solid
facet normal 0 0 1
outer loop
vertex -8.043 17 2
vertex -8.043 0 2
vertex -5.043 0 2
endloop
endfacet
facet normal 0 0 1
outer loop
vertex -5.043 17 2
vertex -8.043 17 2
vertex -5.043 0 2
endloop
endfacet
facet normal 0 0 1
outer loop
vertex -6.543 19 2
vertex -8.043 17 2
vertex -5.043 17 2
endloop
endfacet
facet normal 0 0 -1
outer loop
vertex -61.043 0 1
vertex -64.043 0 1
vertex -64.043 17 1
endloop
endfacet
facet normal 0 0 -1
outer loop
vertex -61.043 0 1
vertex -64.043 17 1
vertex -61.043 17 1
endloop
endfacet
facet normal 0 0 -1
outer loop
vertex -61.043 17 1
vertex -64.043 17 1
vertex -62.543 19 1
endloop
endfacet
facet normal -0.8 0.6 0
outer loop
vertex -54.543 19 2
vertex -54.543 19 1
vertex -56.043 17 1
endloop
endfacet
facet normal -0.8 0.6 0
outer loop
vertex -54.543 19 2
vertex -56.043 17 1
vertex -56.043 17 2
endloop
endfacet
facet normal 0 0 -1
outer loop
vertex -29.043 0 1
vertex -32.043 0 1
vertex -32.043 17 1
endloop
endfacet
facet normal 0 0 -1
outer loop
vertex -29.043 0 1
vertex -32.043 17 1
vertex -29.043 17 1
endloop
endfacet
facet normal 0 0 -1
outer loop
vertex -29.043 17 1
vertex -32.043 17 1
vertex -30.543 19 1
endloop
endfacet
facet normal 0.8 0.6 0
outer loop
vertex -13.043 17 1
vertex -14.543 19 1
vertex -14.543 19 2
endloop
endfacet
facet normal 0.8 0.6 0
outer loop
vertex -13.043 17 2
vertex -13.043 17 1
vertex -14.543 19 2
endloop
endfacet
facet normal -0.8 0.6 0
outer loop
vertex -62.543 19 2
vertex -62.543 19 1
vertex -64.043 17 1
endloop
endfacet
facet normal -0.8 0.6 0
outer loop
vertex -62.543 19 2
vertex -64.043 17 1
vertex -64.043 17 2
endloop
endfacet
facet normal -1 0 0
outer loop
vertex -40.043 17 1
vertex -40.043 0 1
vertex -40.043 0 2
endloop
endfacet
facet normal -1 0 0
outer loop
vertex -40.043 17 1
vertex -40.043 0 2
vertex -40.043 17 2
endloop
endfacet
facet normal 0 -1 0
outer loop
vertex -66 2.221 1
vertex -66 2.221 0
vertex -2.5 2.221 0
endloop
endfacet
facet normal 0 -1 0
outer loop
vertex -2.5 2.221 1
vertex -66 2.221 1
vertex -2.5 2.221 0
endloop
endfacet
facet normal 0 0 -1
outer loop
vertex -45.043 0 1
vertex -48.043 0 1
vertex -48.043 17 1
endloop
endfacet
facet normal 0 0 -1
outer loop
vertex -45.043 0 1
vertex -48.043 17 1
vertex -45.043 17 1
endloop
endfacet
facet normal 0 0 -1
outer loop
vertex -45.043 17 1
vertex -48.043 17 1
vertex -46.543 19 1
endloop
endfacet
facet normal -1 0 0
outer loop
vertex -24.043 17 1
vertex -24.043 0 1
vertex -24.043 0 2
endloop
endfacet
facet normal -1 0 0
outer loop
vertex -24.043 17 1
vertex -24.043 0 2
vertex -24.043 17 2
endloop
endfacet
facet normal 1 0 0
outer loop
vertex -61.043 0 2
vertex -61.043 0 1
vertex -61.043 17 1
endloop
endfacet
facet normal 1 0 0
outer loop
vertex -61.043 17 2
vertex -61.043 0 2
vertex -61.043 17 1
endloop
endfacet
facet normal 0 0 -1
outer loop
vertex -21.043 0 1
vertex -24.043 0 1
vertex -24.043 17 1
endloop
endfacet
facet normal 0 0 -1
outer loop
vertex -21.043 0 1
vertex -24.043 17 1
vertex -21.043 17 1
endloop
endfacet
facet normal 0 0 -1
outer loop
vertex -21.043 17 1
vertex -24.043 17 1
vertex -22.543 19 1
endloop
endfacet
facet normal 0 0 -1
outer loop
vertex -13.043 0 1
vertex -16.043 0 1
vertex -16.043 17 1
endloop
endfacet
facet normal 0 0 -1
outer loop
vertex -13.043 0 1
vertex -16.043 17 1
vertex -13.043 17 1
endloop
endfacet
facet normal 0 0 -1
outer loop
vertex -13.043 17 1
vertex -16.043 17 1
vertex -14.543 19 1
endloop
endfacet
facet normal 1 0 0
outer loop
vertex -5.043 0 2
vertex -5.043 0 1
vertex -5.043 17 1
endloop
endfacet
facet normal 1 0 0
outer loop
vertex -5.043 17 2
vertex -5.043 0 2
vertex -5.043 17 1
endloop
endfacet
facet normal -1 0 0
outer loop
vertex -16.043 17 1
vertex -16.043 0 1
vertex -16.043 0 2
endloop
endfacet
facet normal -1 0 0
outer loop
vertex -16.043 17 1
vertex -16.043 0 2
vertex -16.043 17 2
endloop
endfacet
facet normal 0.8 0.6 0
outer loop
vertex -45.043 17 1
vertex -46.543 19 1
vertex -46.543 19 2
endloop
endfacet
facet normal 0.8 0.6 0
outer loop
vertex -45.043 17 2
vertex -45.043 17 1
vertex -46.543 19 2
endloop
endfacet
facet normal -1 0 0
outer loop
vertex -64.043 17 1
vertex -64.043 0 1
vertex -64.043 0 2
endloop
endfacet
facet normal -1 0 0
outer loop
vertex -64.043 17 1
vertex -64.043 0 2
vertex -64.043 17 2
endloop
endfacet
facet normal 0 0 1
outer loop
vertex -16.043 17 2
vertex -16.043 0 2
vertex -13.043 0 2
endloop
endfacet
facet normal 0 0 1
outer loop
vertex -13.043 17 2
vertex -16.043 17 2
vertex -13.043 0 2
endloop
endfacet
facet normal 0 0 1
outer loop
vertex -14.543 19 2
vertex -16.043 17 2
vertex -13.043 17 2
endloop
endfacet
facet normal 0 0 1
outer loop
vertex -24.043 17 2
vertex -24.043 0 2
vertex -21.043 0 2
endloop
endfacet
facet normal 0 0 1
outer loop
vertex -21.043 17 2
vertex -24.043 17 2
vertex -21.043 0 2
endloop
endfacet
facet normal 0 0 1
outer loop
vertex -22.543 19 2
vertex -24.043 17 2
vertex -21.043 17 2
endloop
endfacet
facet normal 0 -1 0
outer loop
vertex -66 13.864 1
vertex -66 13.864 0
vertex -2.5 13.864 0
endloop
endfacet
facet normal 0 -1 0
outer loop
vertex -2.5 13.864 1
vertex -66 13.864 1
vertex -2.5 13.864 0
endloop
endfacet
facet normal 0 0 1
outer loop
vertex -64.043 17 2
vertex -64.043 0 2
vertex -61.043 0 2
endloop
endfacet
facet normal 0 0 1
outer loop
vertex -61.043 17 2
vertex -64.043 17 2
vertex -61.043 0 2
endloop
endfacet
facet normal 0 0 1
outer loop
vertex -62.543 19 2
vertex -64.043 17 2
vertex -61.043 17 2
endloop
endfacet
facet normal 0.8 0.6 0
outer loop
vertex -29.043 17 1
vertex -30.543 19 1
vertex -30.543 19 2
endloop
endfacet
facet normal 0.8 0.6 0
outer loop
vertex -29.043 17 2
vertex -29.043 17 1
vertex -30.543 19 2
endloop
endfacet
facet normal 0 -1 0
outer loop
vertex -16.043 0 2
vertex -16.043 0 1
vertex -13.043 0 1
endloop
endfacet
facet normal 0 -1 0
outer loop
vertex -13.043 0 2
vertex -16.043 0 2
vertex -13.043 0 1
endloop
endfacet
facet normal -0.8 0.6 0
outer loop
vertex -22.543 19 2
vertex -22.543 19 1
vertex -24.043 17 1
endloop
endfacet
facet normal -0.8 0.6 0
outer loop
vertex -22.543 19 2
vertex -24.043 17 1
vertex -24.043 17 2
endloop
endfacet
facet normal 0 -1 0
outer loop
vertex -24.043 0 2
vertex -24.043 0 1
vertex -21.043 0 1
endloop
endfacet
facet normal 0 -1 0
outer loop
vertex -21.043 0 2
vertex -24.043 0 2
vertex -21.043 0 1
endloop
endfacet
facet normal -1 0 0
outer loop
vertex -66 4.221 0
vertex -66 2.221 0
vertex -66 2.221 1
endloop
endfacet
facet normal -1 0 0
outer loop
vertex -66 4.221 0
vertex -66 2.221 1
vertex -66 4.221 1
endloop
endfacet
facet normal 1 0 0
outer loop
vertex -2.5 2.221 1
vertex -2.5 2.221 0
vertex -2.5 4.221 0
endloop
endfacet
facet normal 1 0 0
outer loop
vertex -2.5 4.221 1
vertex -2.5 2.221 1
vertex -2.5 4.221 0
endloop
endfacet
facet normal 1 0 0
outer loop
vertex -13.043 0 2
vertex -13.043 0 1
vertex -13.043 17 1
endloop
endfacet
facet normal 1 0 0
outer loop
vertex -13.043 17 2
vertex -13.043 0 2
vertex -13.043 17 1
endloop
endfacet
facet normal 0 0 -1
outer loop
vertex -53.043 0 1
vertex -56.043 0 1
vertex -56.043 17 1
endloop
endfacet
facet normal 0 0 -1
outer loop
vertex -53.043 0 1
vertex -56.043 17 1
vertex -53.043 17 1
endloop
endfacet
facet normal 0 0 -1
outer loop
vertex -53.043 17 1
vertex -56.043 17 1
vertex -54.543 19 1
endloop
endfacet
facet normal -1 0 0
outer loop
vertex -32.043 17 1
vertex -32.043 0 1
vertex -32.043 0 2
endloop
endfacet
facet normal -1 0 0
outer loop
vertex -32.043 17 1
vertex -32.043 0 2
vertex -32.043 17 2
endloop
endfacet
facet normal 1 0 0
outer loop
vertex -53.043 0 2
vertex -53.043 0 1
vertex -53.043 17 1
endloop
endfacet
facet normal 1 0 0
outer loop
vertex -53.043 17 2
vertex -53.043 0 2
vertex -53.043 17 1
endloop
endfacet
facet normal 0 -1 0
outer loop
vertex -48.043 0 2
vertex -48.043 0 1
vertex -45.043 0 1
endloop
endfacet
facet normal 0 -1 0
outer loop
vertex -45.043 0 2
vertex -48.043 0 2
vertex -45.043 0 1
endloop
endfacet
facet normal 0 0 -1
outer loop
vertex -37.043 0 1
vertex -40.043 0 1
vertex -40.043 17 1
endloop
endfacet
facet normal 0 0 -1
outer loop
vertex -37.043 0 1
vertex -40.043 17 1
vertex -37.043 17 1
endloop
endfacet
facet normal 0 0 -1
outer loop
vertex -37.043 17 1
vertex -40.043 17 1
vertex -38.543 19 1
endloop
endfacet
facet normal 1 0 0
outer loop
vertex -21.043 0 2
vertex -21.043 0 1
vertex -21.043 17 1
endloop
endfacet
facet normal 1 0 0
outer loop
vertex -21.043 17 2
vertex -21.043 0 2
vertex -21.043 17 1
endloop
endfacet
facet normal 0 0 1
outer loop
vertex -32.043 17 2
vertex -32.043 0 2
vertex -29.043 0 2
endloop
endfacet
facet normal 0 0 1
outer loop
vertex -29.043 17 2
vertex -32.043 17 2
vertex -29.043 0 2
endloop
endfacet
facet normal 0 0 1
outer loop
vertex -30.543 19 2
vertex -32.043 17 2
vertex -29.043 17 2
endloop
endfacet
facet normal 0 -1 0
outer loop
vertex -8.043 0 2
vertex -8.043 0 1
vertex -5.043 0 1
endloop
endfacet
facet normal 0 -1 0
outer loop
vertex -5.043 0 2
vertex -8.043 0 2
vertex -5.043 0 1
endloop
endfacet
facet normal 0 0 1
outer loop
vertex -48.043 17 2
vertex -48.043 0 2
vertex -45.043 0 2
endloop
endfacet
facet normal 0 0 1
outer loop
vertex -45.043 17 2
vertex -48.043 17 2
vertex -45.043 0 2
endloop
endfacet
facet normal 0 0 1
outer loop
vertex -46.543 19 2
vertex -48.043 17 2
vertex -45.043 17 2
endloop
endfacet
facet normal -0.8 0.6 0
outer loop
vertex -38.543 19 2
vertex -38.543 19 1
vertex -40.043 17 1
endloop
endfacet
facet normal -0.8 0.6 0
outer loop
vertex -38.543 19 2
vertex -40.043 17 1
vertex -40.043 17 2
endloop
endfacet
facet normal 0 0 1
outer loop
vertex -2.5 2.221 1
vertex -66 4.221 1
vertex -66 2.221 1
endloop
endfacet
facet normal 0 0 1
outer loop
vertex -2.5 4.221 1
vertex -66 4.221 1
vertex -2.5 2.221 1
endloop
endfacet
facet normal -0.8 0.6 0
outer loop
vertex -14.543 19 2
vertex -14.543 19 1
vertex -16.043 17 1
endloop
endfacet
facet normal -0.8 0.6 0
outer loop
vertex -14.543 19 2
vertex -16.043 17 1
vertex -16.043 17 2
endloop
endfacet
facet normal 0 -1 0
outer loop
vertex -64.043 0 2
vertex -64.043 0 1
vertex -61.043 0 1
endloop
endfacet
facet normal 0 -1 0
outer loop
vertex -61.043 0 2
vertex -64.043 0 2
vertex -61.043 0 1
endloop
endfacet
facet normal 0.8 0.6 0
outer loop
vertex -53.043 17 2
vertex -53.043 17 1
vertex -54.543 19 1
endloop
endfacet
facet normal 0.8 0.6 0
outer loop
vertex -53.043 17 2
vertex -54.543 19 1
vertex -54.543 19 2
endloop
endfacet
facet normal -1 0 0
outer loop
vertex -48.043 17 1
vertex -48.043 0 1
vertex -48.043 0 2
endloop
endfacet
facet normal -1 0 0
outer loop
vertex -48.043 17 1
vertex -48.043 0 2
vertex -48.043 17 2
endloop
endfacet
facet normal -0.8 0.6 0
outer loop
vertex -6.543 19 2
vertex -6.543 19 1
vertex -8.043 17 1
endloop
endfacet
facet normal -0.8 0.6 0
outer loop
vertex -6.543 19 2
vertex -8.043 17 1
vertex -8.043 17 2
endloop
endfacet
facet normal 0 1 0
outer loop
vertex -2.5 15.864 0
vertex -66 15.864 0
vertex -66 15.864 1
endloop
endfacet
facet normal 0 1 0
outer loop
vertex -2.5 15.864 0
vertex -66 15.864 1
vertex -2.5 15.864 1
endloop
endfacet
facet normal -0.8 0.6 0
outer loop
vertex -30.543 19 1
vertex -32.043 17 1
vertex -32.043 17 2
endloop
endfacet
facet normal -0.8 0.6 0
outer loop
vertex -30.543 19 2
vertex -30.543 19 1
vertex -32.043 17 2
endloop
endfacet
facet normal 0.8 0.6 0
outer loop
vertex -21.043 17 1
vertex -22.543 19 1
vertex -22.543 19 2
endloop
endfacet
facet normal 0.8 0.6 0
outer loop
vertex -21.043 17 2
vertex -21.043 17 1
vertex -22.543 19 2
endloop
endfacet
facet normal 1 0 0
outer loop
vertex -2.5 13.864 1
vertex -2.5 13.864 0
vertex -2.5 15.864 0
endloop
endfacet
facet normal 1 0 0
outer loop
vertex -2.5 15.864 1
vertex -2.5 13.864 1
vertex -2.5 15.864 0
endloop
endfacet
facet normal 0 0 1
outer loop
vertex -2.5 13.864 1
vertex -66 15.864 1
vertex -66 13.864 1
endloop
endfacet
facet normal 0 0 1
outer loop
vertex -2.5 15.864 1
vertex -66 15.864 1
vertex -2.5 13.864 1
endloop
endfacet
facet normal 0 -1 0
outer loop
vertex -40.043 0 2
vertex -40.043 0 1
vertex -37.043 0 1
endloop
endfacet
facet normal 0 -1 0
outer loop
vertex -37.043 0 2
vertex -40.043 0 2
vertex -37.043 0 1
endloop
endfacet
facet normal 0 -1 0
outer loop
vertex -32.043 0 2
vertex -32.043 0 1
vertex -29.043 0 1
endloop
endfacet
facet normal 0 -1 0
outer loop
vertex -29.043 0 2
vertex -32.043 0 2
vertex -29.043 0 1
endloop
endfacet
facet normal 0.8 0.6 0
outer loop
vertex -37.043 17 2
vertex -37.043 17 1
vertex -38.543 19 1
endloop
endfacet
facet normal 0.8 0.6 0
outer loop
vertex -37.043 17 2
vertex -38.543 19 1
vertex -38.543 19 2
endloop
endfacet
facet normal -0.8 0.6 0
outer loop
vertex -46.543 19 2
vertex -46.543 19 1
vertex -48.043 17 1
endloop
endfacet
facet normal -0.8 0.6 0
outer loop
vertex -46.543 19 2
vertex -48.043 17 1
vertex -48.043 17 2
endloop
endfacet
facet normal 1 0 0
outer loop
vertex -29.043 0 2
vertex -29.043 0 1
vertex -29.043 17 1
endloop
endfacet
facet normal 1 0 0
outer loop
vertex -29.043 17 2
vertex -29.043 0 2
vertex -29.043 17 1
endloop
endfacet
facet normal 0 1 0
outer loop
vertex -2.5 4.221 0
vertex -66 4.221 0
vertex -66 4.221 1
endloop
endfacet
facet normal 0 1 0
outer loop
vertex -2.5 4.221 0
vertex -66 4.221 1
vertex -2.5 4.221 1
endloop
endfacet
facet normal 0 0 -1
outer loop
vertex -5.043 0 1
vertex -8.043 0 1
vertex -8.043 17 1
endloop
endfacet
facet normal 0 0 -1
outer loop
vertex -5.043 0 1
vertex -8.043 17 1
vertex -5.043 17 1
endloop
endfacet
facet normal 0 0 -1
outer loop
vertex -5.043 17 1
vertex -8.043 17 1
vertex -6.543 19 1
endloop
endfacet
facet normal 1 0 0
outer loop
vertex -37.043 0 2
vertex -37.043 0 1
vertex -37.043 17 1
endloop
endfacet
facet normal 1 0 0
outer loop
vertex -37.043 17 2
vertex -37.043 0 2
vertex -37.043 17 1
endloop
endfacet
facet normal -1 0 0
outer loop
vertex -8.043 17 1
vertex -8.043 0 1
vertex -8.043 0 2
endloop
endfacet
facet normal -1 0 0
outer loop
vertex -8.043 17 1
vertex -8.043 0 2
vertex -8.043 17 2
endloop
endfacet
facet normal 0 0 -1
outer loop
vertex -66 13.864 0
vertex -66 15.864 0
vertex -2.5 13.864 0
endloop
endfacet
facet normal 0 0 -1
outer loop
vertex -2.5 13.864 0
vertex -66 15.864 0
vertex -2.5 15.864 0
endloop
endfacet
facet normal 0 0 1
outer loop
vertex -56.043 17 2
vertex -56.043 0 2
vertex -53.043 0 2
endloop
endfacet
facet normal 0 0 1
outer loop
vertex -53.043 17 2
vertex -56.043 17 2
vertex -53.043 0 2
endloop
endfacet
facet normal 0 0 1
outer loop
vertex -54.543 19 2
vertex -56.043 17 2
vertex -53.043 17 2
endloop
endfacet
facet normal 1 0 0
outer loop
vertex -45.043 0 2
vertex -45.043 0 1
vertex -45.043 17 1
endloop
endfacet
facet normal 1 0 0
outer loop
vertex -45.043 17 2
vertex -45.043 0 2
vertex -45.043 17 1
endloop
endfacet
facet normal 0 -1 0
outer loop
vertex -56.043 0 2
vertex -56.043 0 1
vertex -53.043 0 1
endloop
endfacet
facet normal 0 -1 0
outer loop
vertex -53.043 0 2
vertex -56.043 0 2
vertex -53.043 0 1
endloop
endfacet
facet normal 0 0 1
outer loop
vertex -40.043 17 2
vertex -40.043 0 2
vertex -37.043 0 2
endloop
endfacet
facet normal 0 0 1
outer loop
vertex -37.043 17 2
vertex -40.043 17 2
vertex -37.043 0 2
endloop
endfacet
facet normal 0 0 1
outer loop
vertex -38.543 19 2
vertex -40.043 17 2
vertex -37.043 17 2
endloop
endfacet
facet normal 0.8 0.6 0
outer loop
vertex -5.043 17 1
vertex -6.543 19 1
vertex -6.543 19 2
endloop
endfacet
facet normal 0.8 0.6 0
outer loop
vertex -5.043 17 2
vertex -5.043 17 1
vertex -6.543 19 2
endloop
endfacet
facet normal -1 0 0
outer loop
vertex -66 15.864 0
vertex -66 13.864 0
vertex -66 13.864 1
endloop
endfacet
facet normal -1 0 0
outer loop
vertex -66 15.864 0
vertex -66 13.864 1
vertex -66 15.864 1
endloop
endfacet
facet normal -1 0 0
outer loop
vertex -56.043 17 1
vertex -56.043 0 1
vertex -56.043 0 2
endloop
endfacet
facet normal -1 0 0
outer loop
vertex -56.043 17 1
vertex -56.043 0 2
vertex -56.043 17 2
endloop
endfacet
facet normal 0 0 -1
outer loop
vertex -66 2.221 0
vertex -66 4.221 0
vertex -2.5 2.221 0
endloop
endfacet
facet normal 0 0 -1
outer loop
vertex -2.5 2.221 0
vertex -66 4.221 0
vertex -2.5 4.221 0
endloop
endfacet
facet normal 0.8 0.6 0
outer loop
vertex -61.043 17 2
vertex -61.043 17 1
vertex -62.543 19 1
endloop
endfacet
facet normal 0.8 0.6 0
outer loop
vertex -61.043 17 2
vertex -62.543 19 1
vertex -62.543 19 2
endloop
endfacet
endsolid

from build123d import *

# Parameters (mm, degrees)
F1_START    = 1
F0_W        = 3
F0_H        = 19
F1_DEPTH    = 1
F2_W        = 63.5
F2_H        = 2
F3_DEPTH    = 1
F4_SIZE2    = 1.5
F4_SIZE     = 2
F4_2_SIZE2  = 1.49999
F4_2_SIZE   = 1.99999
F4_3_SIZE2  = 1.5
F4_3_SIZE   = 2
F4_4_SIZE2  = 1.49999
F4_4_SIZE   = 1.99999
F4_5_SIZE2  = 1.5
F4_5_SIZE   = 2
F4_6_SIZE2  = 1.49999
F4_6_SIZE   = 1.99999
F4_7_SIZE2  = 1.5
F4_7_SIZE   = 2
F4_8_SIZE2  = 1.49999
F4_8_SIZE   = 1.99999
F4_9_SIZE2  = 1.5
F4_9_SIZE   = 2
F4_10_SIZE2 = 1.49999
F4_10_SIZE  = 1.99999
F4_11_SIZE2 = 1.5
F4_11_SIZE  = 2
F4_12_SIZE2 = 1.49999
F4_12_SIZE  = 1.99999
F4_13_SIZE2 = 1.5
F4_13_SIZE  = 2
F4_14_SIZE2 = 1.49999
F4_14_SIZE  = 1.99999
F4_15_SIZE2 = 1.5
F4_15_SIZE  = 2
F4_16_SIZE2 = 1.49999
F4_16_SIZE  = 1.99999


# Not quite as in the source:
# - a fillet or chamfer is up to 0.001 mm smaller than in the source, because OpenCascade refuses the exact size


with BuildPart() as f1:
    # F0 (on Top) → F1 (new body)
    with BuildSketch(Plane.XY.offset(F1_START)):
        with Locations((-62.5430910557, 9.5)):
            Rectangle(F0_W, F0_H)
    extrude(amount=F1_DEPTH)

    # F4
    f4_edges = [f1.edges().sort_by_distance(p)[0] for p in [
        (-64.043091, 19, 1.5),
    ]]
    f4_side = f1.faces().sort_by_distance((-64.043091, 9.5, 1.5))[0]
    chamfer(f4_edges, length=F4_SIZE, length2=F4_SIZE2, reference=f4_side)

    # F4#2 (size 2 and 1.5 in the source; OpenCascade refuses exactly that, so slightly less here)
    f4_2_edges = [f1.edges().sort_by_distance(p)[0] for p in [
        (-61.043091, 19, 1.5),
    ]]
    f4_2_side = f1.faces().sort_by_distance((-61.043091, 9.5, 1.5))[0]
    chamfer(f4_2_edges, length=F4_2_SIZE, length2=F4_2_SIZE2, reference=f4_2_side)


with BuildPart() as f1b:
    # F0 (on Top) → F1, piece 2 (new body)
    with BuildSketch(Plane.XY.offset(F1_START)):
        with Locations((-54.5430910557, 9.5)):
            Rectangle(F0_W, F0_H)
    extrude(amount=F1_DEPTH)

    # F4#3
    f4_3_edges = [f1b.edges().sort_by_distance(p)[0] for p in [
        (-56.043091, 19, 1.5),
    ]]
    f4_3_side = f1b.faces().sort_by_distance((-56.043091, 9.5, 1.5))[0]
    chamfer(f4_3_edges, length=F4_3_SIZE, length2=F4_3_SIZE2, reference=f4_3_side)

    # F4#4 (size 2 and 1.5 in the source; OpenCascade refuses exactly that, so slightly less here)
    f4_4_edges = [f1b.edges().sort_by_distance(p)[0] for p in [
        (-53.043091, 19, 1.5),
    ]]
    f4_4_side = f1b.faces().sort_by_distance((-53.043091, 9.5, 1.5))[0]
    chamfer(f4_4_edges, length=F4_4_SIZE, length2=F4_4_SIZE2, reference=f4_4_side)


with BuildPart() as f1c:
    # F0 (on Top) → F1, piece 3 (new body)
    with BuildSketch(Plane.XY.offset(F1_START)):
        with Locations((-46.5430910557, 9.5)):
            Rectangle(F0_W, F0_H)
    extrude(amount=F1_DEPTH)

    # F4#5
    f4_5_edges = [f1c.edges().sort_by_distance(p)[0] for p in [
        (-48.043091, 19, 1.5),
    ]]
    f4_5_side = f1c.faces().sort_by_distance((-48.043091, 9.5, 1.5))[0]
    chamfer(f4_5_edges, length=F4_5_SIZE, length2=F4_5_SIZE2, reference=f4_5_side)

    # F4#6 (size 2 and 1.5 in the source; OpenCascade refuses exactly that, so slightly less here)
    f4_6_edges = [f1c.edges().sort_by_distance(p)[0] for p in [
        (-45.043091, 19, 1.5),
    ]]
    f4_6_side = f1c.faces().sort_by_distance((-45.043091, 9.5, 1.5))[0]
    chamfer(f4_6_edges, length=F4_6_SIZE, length2=F4_6_SIZE2, reference=f4_6_side)


with BuildPart() as f1d:
    # F0 (on Top) → F1, piece 4 (new body)
    with BuildSketch(Plane.XY.offset(F1_START)):
        with Locations((-38.5430910557, 9.5)):
            Rectangle(F0_W, F0_H)
    extrude(amount=F1_DEPTH)

    # F4#7
    f4_7_edges = [f1d.edges().sort_by_distance(p)[0] for p in [
        (-40.043091, 19, 1.5),
    ]]
    f4_7_side = f1d.faces().sort_by_distance((-40.043091, 9.5, 1.5))[0]
    chamfer(f4_7_edges, length=F4_7_SIZE, length2=F4_7_SIZE2, reference=f4_7_side)

    # F4#8 (size 2 and 1.5 in the source; OpenCascade refuses exactly that, so slightly less here)
    f4_8_edges = [f1d.edges().sort_by_distance(p)[0] for p in [
        (-37.043091, 19, 1.5),
    ]]
    f4_8_side = f1d.faces().sort_by_distance((-37.043091, 9.5, 1.5))[0]
    chamfer(f4_8_edges, length=F4_8_SIZE, length2=F4_8_SIZE2, reference=f4_8_side)


with BuildPart() as f1e:
    # F0 (on Top) → F1, piece 5 (new body)
    with BuildSketch(Plane.XY.offset(F1_START)):
        with Locations((-30.5430910557, 9.5)):
            Rectangle(F0_W, F0_H)
    extrude(amount=F1_DEPTH)

    # F4#9
    f4_9_edges = [f1e.edges().sort_by_distance(p)[0] for p in [
        (-32.043091, 19, 1.5),
    ]]
    f4_9_side = f1e.faces().sort_by_distance((-32.043091, 9.5, 1.5))[0]
    chamfer(f4_9_edges, length=F4_9_SIZE, length2=F4_9_SIZE2, reference=f4_9_side)

    # F4#10 (size 2 and 1.5 in the source; OpenCascade refuses exactly that, so slightly less here)
    f4_10_edges = [f1e.edges().sort_by_distance(p)[0] for p in [
        (-29.043091, 19, 1.5),
    ]]
    f4_10_side = f1e.faces().sort_by_distance((-29.043091, 9.5, 1.5))[0]
    chamfer(f4_10_edges, length=F4_10_SIZE, length2=F4_10_SIZE2, reference=f4_10_side)


with BuildPart() as f1f:
    # F0 (on Top) → F1, piece 6 (new body)
    with BuildSketch(Plane.XY.offset(F1_START)):
        with Locations((-22.5430910557, 9.5)):
            Rectangle(F0_W, F0_H)
    extrude(amount=F1_DEPTH)

    # F4#15
    f4_15_edges = [f1f.edges().sort_by_distance(p)[0] for p in [
        (-24.043091, 19, 1.5),
    ]]
    f4_15_side = f1f.faces().sort_by_distance((-24.043091, 9.5, 1.5))[0]
    chamfer(f4_15_edges, length=F4_15_SIZE, length2=F4_15_SIZE2, reference=f4_15_side)

    # F4#16 (size 2 and 1.5 in the source; OpenCascade refuses exactly that, so slightly less here)
    f4_16_edges = [f1f.edges().sort_by_distance(p)[0] for p in [
        (-21.043091, 19, 1.5),
    ]]
    f4_16_side = f1f.faces().sort_by_distance((-21.043091, 9.5, 1.5))[0]
    chamfer(f4_16_edges, length=F4_16_SIZE, length2=F4_16_SIZE2, reference=f4_16_side)


with BuildPart() as f1g:
    # F0 (on Top) → F1, piece 7 (new body)
    with BuildSketch(Plane.XY.offset(F1_START)):
        with Locations((-14.5430910557, 9.5)):
            Rectangle(F0_W, F0_H)
    extrude(amount=F1_DEPTH)

    # F4#11
    f4_11_edges = [f1g.edges().sort_by_distance(p)[0] for p in [
        (-16.043091, 19, 1.5),
    ]]
    f4_11_side = f1g.faces().sort_by_distance((-16.043091, 9.5, 1.5))[0]
    chamfer(f4_11_edges, length=F4_11_SIZE, length2=F4_11_SIZE2, reference=f4_11_side)

    # F4#12 (size 2 and 1.5 in the source; OpenCascade refuses exactly that, so slightly less here)
    f4_12_edges = [f1g.edges().sort_by_distance(p)[0] for p in [
        (-13.043091, 19, 1.5),
    ]]
    f4_12_side = f1g.faces().sort_by_distance((-13.043091, 9.5, 1.5))[0]
    chamfer(f4_12_edges, length=F4_12_SIZE, length2=F4_12_SIZE2, reference=f4_12_side)


with BuildPart() as f1h:
    # F0 (on Top) → F1, piece 8 (new body)
    with BuildSketch(Plane.XY.offset(F1_START)):
        with Locations((-6.5430910557, 9.5)):
            Rectangle(F0_W, F0_H)
    extrude(amount=F1_DEPTH)

    # F4#13
    f4_13_edges = [f1h.edges().sort_by_distance(p)[0] for p in [
        (-8.043091, 19, 1.5),
    ]]
    f4_13_side = f1h.faces().sort_by_distance((-8.043091, 9.5, 1.5))[0]
    chamfer(f4_13_edges, length=F4_13_SIZE, length2=F4_13_SIZE2, reference=f4_13_side)

    # F4#14 (size 2 and 1.5 in the source; OpenCascade refuses exactly that, so slightly less here)
    f4_14_edges = [f1h.edges().sort_by_distance(p)[0] for p in [
        (-5.043091, 19, 1.5),
    ]]
    f4_14_side = f1h.faces().sort_by_distance((-5.043091, 9.5, 1.5))[0]
    chamfer(f4_14_edges, length=F4_14_SIZE, length2=F4_14_SIZE2, reference=f4_14_side)


with BuildPart() as f3:
    # F2 (on Top) → F3 (new body)
    with BuildSketch(Plane.XY):
        with Locations((-34.25, 14.8639390082)):
            Rectangle(F2_W, F2_H)
    extrude(amount=F3_DEPTH)


with BuildPart() as f3b:
    # F2 (on Top) → F3, piece 2 (new body)
    with BuildSketch(Plane.XY):
        with Locations((-34.25, 3.2210190073)):
            Rectangle(F2_W, F2_H)
    extrude(amount=F3_DEPTH)


solid = Compound([f1.part, f1b.part, f1c.part, f1d.part, f1e.part, f1f.part, f1g.part, f1h.part, f3.part, f3b.part])
